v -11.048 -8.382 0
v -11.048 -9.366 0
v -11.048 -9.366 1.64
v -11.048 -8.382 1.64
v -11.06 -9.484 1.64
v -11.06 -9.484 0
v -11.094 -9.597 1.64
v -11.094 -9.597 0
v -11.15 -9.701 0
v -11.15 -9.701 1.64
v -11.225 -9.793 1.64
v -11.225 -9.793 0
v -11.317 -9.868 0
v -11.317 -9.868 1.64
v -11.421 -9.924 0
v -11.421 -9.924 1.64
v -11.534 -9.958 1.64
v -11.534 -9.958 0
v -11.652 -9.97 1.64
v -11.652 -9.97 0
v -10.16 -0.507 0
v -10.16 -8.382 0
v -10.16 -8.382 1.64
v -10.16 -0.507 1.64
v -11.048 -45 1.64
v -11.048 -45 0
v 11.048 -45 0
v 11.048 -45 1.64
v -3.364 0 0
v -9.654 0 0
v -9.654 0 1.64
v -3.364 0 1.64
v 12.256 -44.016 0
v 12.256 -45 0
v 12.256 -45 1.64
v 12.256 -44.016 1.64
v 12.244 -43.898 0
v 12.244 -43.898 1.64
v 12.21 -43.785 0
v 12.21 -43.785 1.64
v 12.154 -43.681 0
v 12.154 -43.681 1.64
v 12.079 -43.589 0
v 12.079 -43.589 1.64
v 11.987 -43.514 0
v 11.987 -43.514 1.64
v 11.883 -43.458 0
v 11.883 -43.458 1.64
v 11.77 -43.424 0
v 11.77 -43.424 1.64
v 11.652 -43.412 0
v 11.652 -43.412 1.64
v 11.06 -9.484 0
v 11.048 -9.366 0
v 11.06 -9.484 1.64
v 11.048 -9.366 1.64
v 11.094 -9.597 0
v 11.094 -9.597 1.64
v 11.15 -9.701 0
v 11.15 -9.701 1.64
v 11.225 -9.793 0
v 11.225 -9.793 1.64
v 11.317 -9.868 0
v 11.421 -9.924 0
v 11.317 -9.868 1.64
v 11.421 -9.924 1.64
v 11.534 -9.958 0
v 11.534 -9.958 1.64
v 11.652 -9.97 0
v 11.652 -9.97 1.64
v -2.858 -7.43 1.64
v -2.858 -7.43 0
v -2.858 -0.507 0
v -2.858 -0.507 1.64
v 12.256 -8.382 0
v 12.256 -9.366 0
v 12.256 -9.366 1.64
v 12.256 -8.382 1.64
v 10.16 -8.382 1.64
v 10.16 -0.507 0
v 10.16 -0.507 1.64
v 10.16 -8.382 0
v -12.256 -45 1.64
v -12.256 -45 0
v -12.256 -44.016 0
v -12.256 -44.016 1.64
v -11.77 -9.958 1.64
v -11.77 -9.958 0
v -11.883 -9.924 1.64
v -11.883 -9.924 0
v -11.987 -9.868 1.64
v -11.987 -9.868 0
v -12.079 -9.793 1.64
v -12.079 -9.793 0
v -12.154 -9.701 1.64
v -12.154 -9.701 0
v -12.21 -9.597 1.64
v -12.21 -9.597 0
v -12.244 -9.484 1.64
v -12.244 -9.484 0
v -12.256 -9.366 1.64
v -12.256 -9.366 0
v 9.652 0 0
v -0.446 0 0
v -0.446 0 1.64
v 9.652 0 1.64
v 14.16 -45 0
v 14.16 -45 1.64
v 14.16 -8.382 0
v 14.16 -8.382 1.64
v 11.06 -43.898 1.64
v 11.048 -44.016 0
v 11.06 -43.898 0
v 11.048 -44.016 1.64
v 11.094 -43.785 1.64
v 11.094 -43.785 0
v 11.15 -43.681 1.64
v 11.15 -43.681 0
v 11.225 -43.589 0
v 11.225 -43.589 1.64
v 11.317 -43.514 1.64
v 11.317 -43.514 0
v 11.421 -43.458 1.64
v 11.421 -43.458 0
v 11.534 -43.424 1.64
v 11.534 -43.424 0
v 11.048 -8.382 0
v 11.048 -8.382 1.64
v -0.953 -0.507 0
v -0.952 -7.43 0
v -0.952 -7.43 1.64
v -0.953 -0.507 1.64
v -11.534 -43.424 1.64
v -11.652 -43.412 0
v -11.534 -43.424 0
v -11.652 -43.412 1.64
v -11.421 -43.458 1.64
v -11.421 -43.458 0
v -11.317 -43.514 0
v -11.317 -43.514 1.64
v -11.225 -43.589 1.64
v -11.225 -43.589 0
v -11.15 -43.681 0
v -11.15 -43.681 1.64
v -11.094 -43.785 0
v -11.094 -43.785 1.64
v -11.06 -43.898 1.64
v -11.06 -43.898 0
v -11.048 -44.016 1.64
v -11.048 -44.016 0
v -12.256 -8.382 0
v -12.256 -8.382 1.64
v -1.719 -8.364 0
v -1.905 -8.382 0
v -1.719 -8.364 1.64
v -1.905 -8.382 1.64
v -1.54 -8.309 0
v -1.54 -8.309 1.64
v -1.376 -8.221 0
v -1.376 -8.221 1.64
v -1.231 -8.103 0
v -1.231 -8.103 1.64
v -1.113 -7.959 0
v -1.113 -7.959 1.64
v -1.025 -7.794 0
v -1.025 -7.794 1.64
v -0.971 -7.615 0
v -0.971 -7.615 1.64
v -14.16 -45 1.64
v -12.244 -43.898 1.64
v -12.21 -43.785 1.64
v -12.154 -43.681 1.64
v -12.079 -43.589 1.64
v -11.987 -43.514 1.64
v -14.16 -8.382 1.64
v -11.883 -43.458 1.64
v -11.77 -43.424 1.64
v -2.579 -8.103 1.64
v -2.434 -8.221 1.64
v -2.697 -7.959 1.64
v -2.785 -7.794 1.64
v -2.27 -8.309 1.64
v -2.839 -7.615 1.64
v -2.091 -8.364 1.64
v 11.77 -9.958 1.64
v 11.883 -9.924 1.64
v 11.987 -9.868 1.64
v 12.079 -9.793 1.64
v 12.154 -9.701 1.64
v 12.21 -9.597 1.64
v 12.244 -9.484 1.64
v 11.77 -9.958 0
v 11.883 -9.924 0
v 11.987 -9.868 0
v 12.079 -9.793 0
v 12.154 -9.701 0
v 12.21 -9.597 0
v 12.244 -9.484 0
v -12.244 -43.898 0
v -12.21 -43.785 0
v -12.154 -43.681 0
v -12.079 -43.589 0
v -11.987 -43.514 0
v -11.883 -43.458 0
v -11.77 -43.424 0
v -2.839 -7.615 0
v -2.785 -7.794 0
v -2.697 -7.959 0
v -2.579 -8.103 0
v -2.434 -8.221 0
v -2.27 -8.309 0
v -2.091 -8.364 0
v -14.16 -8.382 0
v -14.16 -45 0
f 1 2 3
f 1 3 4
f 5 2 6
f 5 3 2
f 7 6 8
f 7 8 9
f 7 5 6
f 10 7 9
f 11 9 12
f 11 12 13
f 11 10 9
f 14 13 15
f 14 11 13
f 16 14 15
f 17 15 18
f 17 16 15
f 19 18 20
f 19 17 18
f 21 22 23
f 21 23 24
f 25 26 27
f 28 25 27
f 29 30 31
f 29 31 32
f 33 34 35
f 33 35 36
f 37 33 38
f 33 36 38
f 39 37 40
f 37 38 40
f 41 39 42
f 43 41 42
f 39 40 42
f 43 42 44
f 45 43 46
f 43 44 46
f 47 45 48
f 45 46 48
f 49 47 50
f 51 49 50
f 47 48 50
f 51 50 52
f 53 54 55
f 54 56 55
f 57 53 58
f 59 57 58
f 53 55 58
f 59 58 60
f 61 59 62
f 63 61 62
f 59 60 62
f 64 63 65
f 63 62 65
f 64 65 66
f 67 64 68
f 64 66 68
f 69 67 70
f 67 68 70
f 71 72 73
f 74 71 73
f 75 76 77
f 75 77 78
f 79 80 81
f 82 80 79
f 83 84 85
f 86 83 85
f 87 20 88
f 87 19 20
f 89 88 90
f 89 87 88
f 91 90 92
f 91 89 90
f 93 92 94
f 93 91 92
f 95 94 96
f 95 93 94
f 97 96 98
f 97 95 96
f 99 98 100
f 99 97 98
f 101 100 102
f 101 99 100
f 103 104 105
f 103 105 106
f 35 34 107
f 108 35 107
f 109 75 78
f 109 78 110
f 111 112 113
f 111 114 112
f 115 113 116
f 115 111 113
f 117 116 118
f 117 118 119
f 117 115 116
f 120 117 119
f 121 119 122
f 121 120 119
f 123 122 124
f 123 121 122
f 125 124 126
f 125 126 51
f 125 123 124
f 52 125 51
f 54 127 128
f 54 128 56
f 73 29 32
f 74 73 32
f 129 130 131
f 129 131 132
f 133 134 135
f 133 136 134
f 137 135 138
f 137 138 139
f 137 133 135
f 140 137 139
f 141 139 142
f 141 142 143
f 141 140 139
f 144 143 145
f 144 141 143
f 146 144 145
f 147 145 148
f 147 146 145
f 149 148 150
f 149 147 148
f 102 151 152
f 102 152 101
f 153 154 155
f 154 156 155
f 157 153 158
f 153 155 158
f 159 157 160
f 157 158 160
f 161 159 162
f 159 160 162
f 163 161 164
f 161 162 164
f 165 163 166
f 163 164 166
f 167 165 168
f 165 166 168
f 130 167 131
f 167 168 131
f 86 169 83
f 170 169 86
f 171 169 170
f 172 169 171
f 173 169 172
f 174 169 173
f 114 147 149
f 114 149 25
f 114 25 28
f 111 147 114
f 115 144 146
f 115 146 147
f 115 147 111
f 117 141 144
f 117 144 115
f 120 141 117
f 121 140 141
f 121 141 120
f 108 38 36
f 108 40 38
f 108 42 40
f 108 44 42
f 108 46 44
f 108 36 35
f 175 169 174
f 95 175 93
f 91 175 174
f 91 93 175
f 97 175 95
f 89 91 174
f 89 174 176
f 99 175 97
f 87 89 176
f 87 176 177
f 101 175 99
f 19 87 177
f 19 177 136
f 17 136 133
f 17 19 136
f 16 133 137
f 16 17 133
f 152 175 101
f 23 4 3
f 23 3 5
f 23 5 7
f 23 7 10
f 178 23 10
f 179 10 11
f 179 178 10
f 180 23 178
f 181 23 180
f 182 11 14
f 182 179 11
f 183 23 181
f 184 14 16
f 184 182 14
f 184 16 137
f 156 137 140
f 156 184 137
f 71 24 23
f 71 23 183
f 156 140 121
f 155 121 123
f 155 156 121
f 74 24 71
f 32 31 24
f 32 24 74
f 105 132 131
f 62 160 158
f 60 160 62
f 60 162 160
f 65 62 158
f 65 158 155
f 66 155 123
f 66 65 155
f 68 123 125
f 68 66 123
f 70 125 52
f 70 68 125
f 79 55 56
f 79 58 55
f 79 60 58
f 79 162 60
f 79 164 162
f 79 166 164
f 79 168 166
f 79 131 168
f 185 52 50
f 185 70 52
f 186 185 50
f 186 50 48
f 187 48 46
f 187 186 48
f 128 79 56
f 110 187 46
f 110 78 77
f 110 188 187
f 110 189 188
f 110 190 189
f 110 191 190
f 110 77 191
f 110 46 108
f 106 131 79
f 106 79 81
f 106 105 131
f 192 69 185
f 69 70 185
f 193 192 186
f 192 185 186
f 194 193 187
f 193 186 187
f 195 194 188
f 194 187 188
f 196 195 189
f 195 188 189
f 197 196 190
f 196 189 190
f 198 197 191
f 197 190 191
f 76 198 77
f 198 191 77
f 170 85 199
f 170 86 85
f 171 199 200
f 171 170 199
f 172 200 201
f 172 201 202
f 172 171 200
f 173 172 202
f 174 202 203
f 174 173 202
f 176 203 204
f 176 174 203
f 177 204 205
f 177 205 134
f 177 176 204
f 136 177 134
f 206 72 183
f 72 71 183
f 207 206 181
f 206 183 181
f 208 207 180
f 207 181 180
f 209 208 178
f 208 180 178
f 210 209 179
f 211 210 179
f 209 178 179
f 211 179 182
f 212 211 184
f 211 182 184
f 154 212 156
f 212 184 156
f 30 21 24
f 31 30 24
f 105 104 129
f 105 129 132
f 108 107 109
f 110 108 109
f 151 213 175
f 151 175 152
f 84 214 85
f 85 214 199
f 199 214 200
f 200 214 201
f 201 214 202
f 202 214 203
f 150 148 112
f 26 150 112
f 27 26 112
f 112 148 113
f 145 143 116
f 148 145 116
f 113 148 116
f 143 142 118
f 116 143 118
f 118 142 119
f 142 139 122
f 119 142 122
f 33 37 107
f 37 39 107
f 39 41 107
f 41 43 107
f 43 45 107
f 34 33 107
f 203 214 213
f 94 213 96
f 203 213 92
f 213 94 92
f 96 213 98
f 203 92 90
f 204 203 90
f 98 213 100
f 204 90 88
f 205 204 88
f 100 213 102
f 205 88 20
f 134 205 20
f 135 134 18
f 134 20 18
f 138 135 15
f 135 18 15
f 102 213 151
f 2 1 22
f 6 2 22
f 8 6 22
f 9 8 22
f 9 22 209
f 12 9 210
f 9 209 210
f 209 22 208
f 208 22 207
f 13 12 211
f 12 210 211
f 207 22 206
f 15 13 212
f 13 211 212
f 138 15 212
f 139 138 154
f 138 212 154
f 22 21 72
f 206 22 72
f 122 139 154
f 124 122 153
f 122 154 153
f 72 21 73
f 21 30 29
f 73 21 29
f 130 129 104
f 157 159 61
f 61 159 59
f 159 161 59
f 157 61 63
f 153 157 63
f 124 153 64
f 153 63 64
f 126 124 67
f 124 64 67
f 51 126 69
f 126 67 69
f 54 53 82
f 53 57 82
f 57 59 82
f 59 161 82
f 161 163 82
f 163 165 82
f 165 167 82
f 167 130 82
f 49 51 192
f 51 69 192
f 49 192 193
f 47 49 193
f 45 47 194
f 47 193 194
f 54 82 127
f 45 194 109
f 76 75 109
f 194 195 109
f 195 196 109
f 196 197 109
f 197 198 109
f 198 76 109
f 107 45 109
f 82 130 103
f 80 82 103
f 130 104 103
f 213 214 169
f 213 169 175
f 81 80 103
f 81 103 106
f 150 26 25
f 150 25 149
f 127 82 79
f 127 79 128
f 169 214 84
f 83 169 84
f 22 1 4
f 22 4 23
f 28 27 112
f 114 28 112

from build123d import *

# Parameters (mm, degrees)
F0_W     = 28.321
F0_H     = 45
F1_DEPTH = 1.64
F2_W     = 1.905
F2_H     = 8.382
F2_W_2   = 1.207
F2_H_2   = 1.5875
F3_DEPTH = 25
F4_R     = 0.95249
F5_SIZE  = 0.507
F6_R     = 0.60349


# Not quite as in the source:
# - a fillet or chamfer is up to 0.001 mm smaller than in the source, because OpenCascade refuses the exact size


with BuildPart() as f1:
    # F0 (on Top) → F1 (new body)
    with BuildSketch(Plane.XY):
        with Locations((0, -22.5)):
            Rectangle(F0_W, F0_H)
    extrude(amount=F1_DEPTH)

    # F2 (on Top) → F3 (cut)
    with BuildSketch(Plane.XY):
        Polygon((-10.1605, 0), (-14.1605, 0), (-14.1605, -8.382), (-12.2555, -8.382), (-12.2555, -9.9695), (-11.0485, -9.9695), (-11.0485, -8.382), (-10.1605, -8.382), align=None)
        with Locations((-1.905, -4.191)):
            Rectangle(F2_W, F2_H)
        Polygon((14.1605, -8.382), (14.1605, 0), (10.1595, 0), (10.1595, -8.382), (11.0485, -8.382), (11.0485, -9.9695), (12.2555, -9.9695), (12.2555, -8.382), align=None)
        with Locations((-11.652, -44.20625)):
            Rectangle(F2_W_2, F2_H_2)
        with Locations((11.652, -44.20625)):
            Rectangle(F2_W_2, F2_H_2)
    extrude(amount=F3_DEPTH, mode=Mode.SUBTRACT)

    # F4 (radius 0.9525 in the source; OpenCascade refuses exactly that, so slightly less here)
    f4_edges = [f1.edges().sort_by_distance(p)[0] for p in [
        (-2.8575, -8.382, 0.82),
        (-0.9525, -8.382, 0.82),
    ]]
    fillet(f4_edges, radius=F4_R)

    # F5
    f5_edges = [f1.edges().sort_by_distance(p)[0] for p in [
        (10.1595, 0, 0.82),
        (-0.9525, 0, 0.82),
        (-2.8575, 0, 0.82),
        (-10.1605, 0, 0.82),
    ]]
    chamfer(f5_edges, length=F5_SIZE)

    # F6 (radius 0.6035 in the source; OpenCascade refuses exactly that, so slightly less here)
    f6_edges = [f1.edges().sort_by_distance(p)[0] for p in [
        (12.2555, -43.4125, 0.82),
        (-12.2555, -43.4125, 0.82),
        (-11.0485, -43.4125, 0.82),
        (11.0485, -43.4125, 0.82),
        (11.0485, -9.9695, 0.82),
        (12.2555, -9.9695, 0.82),
        (-12.2555, -9.9695, 0.82),
        (-11.0485, -9.9695, 0.82),
    ]]
    fillet(f6_edges, radius=F6_R)


solid = f1.part
